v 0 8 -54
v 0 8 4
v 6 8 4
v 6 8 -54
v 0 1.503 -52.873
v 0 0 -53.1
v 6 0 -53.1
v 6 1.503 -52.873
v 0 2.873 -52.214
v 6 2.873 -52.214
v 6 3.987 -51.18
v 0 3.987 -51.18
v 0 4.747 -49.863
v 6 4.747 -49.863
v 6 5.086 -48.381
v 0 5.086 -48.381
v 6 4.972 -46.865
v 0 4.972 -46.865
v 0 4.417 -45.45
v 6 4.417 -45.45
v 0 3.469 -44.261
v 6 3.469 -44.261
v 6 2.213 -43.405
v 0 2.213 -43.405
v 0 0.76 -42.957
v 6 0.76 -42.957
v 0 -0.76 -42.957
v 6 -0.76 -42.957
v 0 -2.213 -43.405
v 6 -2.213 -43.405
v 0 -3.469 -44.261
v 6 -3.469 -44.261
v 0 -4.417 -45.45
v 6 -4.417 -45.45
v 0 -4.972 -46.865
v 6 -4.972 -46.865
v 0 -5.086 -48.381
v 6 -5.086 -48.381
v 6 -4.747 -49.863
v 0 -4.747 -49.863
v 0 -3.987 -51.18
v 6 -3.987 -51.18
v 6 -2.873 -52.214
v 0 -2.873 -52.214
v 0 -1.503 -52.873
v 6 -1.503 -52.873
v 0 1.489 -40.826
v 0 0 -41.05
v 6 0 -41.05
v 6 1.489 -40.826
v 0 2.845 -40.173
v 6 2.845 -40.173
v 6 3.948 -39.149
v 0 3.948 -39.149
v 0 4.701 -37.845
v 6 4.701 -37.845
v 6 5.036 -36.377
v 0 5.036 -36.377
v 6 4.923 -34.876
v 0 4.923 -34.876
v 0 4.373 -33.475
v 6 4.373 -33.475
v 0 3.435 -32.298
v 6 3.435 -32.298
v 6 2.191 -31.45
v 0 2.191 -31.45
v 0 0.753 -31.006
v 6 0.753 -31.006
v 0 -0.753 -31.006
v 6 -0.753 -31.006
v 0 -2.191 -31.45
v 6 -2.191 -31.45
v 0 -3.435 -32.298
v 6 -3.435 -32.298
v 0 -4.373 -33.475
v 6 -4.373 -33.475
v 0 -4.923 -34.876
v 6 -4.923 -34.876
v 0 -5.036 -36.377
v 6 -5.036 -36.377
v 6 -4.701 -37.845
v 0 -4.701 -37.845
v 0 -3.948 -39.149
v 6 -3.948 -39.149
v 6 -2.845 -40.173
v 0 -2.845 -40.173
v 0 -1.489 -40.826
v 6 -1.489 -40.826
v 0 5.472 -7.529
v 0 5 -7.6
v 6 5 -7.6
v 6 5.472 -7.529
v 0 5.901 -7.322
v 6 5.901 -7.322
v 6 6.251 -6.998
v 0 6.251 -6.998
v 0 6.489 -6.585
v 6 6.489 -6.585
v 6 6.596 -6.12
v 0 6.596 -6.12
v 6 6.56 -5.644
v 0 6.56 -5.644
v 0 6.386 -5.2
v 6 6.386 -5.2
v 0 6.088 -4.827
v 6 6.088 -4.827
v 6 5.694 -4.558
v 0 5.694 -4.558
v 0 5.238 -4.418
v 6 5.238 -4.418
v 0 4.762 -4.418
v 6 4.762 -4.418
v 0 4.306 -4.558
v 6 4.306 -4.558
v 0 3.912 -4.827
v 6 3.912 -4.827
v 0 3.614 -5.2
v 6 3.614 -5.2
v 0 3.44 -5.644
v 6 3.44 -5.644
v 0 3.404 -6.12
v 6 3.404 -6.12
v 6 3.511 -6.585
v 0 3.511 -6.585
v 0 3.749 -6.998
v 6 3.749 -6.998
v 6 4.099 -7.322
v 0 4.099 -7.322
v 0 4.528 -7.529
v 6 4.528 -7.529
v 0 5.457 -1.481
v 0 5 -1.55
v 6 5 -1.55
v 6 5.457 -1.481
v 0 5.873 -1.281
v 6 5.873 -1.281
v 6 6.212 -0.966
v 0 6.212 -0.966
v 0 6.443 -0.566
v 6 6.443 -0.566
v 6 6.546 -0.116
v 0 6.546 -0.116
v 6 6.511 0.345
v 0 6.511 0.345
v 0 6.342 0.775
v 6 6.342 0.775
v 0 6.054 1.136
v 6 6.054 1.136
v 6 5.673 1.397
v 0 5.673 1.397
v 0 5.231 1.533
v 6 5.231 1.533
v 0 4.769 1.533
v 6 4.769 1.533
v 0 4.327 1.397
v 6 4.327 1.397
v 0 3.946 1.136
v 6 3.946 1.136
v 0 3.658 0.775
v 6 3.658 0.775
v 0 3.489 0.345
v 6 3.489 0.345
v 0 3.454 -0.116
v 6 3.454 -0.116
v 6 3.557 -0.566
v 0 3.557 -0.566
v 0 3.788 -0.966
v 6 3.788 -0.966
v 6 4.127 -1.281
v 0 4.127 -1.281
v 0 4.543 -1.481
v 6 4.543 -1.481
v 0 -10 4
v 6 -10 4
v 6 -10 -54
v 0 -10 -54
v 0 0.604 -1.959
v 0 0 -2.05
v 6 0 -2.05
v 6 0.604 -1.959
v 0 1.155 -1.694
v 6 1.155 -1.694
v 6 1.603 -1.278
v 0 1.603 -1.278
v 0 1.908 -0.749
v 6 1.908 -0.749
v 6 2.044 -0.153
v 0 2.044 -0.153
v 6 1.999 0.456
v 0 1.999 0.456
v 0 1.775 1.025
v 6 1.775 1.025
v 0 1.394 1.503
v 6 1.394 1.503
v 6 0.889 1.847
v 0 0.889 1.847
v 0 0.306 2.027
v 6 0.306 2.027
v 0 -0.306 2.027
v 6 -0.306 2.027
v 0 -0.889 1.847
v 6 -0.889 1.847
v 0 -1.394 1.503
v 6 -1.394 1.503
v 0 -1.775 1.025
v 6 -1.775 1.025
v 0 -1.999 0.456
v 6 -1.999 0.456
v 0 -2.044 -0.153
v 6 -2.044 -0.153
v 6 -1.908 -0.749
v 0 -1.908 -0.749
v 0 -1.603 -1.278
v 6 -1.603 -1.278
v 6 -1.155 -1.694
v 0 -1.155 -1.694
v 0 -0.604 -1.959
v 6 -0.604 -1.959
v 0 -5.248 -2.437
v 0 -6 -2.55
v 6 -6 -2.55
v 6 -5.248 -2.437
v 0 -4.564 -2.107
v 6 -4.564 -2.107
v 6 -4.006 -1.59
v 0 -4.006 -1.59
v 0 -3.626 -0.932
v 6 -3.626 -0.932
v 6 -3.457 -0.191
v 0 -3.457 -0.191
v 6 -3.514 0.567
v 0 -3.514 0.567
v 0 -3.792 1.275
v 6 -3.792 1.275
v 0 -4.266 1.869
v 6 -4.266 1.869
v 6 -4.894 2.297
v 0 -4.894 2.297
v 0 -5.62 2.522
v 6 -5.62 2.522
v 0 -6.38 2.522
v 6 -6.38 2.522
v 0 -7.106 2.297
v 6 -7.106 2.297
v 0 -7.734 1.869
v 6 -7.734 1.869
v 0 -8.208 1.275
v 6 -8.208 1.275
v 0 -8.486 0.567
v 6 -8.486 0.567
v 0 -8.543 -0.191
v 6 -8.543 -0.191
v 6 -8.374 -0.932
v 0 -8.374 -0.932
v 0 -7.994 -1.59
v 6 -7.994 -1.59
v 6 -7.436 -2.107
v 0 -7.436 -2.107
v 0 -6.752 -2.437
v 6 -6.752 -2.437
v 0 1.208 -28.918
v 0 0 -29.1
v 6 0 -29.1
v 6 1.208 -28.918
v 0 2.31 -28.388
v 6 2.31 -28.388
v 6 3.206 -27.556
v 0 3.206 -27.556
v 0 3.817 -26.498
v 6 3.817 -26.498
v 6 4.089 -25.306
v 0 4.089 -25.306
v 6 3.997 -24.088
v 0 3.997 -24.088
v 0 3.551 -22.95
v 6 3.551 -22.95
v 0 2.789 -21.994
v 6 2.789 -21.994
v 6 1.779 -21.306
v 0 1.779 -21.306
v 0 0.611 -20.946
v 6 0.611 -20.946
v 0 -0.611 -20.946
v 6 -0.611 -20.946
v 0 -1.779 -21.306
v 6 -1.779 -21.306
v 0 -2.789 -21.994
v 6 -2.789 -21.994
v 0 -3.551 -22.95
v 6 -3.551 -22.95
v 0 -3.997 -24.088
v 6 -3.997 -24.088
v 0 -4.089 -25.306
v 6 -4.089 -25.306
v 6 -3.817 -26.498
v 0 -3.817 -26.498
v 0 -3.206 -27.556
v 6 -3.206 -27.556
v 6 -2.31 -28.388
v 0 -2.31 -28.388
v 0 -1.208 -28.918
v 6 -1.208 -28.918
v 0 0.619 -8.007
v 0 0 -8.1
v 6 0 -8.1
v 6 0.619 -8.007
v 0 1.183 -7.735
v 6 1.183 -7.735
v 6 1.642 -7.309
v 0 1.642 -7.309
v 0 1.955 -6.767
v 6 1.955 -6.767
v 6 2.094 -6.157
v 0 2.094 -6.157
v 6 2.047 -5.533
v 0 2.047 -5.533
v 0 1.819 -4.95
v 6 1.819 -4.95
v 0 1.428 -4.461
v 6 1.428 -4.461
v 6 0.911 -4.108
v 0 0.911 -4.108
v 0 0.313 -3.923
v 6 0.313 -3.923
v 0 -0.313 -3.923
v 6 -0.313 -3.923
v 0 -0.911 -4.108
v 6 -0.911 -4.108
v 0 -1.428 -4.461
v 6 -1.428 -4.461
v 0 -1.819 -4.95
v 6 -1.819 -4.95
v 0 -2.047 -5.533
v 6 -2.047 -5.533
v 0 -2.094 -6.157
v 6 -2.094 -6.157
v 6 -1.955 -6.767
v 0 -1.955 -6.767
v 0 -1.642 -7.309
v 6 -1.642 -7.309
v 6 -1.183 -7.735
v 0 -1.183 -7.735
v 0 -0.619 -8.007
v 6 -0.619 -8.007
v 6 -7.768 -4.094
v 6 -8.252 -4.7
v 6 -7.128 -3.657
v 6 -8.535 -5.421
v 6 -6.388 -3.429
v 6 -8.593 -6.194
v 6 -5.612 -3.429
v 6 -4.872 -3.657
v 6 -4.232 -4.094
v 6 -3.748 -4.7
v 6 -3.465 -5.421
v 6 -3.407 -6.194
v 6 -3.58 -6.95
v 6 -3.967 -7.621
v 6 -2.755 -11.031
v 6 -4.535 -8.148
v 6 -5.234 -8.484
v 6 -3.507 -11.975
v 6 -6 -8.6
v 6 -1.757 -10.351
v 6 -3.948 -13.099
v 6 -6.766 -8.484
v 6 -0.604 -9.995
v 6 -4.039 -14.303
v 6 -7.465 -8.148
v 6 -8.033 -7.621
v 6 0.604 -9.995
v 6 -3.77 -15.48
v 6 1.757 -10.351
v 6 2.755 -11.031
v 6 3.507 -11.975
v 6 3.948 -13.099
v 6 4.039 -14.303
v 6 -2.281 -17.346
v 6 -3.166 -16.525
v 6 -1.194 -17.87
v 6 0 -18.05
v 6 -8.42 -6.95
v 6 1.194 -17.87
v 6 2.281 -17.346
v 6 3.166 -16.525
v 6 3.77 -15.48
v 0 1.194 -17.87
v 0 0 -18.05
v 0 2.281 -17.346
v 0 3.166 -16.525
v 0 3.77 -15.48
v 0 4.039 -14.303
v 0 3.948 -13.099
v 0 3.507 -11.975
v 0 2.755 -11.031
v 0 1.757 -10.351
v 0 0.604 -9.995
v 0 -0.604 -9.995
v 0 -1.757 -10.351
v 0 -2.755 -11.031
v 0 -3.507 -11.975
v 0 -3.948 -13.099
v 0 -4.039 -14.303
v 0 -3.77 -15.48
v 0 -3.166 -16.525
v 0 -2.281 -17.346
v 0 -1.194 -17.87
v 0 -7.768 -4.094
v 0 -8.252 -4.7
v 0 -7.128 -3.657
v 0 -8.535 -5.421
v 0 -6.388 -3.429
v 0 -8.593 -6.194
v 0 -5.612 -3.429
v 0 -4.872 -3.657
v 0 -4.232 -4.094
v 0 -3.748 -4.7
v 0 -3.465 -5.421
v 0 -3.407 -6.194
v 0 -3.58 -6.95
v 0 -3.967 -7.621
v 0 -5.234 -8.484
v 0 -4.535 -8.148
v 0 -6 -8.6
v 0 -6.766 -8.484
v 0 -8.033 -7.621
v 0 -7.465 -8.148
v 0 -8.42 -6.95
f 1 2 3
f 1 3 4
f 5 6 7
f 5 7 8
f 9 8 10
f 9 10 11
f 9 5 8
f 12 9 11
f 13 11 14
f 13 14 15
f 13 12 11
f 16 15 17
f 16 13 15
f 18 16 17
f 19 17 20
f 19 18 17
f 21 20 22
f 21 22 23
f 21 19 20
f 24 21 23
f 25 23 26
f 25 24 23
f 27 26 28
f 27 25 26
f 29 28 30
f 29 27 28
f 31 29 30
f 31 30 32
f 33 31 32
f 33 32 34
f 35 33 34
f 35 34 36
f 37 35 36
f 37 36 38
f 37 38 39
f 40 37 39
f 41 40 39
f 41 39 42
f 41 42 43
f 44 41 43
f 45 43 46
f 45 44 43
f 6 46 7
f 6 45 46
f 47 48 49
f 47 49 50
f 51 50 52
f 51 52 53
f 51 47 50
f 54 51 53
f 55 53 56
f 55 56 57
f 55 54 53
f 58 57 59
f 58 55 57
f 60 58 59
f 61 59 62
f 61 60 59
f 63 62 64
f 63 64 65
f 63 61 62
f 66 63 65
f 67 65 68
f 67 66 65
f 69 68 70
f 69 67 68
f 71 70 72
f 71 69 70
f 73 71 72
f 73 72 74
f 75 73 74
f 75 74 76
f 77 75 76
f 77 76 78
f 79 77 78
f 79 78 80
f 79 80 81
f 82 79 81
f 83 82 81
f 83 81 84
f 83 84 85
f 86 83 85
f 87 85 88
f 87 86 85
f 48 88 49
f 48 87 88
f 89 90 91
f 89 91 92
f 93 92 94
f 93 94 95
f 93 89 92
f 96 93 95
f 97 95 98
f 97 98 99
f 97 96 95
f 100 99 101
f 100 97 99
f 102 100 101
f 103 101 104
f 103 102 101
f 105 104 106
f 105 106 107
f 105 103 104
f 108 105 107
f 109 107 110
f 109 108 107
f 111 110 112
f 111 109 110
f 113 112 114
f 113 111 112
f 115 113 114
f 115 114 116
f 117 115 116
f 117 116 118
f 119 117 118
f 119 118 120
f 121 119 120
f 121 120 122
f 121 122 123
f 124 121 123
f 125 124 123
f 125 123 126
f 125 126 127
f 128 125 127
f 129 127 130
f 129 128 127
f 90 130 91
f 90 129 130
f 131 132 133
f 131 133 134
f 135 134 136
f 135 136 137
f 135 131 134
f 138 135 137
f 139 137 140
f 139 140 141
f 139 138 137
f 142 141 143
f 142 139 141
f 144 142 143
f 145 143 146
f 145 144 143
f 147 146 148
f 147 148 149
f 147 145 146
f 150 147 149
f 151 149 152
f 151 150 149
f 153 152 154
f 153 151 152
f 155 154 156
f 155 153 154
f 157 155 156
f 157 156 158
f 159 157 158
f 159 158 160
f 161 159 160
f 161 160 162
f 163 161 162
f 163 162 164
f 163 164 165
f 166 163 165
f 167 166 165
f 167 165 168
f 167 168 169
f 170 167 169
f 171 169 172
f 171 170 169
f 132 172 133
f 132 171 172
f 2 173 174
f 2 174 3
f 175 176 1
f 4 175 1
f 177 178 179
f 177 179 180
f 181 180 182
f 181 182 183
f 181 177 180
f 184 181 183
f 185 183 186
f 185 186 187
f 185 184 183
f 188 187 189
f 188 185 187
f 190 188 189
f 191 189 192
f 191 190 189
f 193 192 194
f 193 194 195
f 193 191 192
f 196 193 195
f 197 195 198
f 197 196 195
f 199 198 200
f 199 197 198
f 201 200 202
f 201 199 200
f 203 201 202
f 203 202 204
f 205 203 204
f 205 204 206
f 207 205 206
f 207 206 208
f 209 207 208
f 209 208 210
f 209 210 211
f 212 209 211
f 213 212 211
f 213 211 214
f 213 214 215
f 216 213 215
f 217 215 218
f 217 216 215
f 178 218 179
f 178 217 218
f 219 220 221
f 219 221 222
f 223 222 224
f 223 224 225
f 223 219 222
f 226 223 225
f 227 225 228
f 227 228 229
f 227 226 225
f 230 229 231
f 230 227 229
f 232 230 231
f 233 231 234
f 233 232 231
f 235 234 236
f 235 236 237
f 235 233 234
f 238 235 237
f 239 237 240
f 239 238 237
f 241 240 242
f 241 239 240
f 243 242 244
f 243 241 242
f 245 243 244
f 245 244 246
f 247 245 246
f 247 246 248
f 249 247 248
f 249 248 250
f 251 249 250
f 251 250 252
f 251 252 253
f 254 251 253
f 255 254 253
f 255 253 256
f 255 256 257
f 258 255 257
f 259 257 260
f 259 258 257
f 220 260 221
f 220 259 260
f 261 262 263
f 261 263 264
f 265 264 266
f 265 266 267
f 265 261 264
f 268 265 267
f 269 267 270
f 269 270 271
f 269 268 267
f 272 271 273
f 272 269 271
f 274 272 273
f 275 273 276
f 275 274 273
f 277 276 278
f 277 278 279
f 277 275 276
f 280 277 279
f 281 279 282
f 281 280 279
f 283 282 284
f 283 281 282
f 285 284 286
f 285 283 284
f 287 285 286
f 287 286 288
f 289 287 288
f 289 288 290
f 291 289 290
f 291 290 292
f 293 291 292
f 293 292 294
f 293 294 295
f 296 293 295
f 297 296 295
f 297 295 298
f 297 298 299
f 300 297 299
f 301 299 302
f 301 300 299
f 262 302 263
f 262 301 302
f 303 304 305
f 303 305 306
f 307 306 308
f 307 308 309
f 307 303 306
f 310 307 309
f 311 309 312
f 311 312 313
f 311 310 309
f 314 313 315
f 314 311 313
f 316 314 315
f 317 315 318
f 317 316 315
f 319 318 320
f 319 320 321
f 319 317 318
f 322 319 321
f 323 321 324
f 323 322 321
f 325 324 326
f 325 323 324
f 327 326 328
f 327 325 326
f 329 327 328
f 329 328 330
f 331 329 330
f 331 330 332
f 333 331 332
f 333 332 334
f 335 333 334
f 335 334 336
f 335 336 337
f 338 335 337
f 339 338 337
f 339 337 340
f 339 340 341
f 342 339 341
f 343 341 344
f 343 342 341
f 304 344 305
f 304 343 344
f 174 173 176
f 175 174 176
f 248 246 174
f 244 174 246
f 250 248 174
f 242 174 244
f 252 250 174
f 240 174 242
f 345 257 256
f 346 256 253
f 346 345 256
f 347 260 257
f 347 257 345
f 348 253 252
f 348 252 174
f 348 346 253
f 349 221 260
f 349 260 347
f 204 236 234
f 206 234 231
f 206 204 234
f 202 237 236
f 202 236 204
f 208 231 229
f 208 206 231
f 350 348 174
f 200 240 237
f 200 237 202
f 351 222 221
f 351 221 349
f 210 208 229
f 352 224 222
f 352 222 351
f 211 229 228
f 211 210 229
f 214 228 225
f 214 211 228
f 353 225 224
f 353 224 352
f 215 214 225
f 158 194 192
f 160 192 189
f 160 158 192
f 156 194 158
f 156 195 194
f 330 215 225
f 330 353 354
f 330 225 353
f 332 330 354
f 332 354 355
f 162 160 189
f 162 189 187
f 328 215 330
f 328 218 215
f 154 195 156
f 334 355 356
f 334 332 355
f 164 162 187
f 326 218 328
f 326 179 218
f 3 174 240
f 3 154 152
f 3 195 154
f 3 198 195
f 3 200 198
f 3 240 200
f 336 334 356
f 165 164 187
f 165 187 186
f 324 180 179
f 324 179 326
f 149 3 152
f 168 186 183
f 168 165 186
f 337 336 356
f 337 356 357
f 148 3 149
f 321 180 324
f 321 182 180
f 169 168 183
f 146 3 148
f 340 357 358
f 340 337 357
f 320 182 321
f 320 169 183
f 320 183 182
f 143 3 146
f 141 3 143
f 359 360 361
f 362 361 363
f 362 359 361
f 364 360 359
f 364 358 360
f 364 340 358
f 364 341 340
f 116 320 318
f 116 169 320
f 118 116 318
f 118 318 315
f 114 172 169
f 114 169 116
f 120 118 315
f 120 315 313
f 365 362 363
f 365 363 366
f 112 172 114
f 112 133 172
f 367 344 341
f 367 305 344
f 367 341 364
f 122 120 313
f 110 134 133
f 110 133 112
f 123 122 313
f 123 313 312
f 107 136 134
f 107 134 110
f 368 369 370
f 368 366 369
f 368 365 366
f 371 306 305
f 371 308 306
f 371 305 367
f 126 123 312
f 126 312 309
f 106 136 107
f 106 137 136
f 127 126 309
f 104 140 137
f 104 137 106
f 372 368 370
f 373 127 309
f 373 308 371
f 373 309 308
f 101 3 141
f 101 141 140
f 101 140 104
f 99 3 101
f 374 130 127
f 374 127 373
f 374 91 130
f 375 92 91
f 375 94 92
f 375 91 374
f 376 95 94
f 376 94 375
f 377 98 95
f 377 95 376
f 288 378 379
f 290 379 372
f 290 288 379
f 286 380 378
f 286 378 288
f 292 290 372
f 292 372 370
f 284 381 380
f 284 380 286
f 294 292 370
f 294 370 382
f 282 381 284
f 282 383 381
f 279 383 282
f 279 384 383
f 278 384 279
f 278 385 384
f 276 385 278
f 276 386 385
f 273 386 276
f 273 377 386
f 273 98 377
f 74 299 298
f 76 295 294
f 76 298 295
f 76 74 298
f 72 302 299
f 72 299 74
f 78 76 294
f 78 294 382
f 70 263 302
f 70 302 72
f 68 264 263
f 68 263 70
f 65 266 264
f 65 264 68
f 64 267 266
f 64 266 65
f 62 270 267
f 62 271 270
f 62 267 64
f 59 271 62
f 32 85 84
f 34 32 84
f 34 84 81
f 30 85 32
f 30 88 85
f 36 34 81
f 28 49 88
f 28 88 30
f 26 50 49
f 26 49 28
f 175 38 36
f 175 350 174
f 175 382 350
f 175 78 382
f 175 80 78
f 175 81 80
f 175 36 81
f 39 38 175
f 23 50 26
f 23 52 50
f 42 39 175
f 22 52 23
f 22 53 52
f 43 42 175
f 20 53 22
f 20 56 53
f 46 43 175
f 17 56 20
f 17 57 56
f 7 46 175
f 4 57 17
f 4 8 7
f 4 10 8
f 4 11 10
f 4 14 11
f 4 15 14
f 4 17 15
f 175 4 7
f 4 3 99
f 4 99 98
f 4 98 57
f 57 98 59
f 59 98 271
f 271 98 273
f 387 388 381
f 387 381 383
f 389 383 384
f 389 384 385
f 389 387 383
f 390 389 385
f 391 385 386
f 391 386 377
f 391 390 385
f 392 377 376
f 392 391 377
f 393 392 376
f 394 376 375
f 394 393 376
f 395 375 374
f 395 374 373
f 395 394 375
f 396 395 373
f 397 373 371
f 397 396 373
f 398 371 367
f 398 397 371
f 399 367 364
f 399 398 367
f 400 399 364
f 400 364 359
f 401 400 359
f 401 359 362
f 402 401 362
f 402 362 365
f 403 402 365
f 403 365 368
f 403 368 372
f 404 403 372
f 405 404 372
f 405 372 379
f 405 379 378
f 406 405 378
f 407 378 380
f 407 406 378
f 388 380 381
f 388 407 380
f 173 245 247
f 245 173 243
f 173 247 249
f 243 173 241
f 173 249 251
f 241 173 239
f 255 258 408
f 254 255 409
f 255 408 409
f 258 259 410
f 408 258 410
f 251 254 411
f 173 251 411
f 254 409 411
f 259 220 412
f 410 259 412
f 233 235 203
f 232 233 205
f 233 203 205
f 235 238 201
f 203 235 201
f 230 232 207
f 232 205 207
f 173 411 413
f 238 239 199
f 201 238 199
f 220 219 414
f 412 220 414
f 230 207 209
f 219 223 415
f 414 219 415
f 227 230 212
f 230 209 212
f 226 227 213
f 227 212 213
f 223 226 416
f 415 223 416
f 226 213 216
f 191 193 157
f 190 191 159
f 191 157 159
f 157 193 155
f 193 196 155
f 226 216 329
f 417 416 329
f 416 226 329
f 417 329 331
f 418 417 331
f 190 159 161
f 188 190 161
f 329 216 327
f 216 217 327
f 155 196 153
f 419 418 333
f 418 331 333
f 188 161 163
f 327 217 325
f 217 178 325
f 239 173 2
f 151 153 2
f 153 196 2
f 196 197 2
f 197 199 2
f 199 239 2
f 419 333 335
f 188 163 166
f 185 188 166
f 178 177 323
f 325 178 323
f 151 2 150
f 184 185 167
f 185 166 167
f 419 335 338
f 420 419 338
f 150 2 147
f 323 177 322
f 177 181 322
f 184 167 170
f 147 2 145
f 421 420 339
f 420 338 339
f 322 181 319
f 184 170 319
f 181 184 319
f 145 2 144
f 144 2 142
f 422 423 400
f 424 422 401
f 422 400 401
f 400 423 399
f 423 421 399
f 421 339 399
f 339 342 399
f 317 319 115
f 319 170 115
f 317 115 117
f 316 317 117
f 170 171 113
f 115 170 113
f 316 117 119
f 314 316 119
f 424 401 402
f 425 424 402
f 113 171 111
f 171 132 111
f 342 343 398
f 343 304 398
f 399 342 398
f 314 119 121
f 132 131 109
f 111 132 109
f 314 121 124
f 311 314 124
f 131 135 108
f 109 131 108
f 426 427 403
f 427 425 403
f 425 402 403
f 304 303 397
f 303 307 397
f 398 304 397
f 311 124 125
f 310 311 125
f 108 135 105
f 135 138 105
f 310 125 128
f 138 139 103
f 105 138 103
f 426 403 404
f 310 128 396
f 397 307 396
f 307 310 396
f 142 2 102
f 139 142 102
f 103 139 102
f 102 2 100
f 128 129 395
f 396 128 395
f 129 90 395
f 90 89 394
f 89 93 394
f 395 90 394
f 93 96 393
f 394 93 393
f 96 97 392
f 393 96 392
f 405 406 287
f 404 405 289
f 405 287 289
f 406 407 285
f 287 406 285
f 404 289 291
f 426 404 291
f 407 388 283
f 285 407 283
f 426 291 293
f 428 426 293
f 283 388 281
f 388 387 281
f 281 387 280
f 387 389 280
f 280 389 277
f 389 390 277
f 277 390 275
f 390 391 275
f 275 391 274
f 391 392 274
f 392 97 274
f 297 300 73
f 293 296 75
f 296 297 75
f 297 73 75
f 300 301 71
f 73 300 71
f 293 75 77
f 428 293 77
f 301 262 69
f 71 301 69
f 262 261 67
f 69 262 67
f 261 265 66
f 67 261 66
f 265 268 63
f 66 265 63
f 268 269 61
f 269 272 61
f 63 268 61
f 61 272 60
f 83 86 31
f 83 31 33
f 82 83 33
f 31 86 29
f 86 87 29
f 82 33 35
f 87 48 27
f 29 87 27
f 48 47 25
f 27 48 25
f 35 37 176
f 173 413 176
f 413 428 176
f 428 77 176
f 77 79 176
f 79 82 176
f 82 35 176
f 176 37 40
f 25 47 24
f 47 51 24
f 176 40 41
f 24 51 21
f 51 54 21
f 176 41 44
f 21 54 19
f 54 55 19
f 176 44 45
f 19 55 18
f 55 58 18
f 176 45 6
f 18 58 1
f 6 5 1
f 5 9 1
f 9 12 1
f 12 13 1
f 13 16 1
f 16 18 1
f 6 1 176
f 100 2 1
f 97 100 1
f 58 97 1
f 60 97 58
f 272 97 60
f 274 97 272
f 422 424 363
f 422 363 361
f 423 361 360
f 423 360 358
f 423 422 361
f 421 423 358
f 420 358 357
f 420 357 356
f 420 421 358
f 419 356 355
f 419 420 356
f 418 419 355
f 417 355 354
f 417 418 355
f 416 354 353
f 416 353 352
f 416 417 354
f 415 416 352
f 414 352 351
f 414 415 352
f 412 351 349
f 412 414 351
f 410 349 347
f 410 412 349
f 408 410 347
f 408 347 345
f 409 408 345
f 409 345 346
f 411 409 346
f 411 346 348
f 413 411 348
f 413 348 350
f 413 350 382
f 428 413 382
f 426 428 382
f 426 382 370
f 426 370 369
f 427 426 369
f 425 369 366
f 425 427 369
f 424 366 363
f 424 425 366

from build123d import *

# Parameters (mm, degrees)
SKETCH_1_W      = 58
SKETCH_1_H      = 18
SKETCH_1_R      = 2.05
SKETCH_1_R_2    = 2.1
SKETCH_1_R_3    = 1.55
SKETCH_1_R_4    = 1.6
SKETCH_1_R_5    = 2.55
SKETCH_1_R_6    = 2.6
SKETCH_1_R_7    = 4.05
SKETCH_1_R_8    = 4.1
SKETCH_1_R_9    = 5.05
SKETCH_1_R_10   = 5.1
EXTRUDE_1_DEPTH = 6


with BuildPart() as part:
    # 草图1 → 凸台-拉伸1 (new body)
    with BuildSketch(Plane(origin=(0, 0, 0), x_dir=(0, 0, -1), z_dir=(1, 0, 0))):
        with Locations((25, -1)):
            Rectangle(SKETCH_1_W, SKETCH_1_H)
        Circle(SKETCH_1_R, mode=Mode.SUBTRACT)
        with Locations((6, 0)):
            Circle(SKETCH_1_R_2, mode=Mode.SUBTRACT)
        with Locations((0, 5)):
            Circle(SKETCH_1_R_3, mode=Mode.SUBTRACT)
        with Locations((6, 5)):
            Circle(SKETCH_1_R_4, mode=Mode.SUBTRACT)
        with Locations((0, -6)):
            Circle(SKETCH_1_R_5, mode=Mode.SUBTRACT)
        with Locations((6, -6)):
            Circle(SKETCH_1_R_6, mode=Mode.SUBTRACT)
        with Locations((14, 0)):
            Circle(SKETCH_1_R_7, mode=Mode.SUBTRACT)
        with Locations((25, 0)):
            Circle(SKETCH_1_R_8, mode=Mode.SUBTRACT)
        with Locations((36, 0)):
            Circle(SKETCH_1_R_9, mode=Mode.SUBTRACT)
        with Locations((48, 0)):
            Circle(SKETCH_1_R_10, mode=Mode.SUBTRACT)
    extrude(amount=EXTRUDE_1_DEPTH)


solid = part.part
